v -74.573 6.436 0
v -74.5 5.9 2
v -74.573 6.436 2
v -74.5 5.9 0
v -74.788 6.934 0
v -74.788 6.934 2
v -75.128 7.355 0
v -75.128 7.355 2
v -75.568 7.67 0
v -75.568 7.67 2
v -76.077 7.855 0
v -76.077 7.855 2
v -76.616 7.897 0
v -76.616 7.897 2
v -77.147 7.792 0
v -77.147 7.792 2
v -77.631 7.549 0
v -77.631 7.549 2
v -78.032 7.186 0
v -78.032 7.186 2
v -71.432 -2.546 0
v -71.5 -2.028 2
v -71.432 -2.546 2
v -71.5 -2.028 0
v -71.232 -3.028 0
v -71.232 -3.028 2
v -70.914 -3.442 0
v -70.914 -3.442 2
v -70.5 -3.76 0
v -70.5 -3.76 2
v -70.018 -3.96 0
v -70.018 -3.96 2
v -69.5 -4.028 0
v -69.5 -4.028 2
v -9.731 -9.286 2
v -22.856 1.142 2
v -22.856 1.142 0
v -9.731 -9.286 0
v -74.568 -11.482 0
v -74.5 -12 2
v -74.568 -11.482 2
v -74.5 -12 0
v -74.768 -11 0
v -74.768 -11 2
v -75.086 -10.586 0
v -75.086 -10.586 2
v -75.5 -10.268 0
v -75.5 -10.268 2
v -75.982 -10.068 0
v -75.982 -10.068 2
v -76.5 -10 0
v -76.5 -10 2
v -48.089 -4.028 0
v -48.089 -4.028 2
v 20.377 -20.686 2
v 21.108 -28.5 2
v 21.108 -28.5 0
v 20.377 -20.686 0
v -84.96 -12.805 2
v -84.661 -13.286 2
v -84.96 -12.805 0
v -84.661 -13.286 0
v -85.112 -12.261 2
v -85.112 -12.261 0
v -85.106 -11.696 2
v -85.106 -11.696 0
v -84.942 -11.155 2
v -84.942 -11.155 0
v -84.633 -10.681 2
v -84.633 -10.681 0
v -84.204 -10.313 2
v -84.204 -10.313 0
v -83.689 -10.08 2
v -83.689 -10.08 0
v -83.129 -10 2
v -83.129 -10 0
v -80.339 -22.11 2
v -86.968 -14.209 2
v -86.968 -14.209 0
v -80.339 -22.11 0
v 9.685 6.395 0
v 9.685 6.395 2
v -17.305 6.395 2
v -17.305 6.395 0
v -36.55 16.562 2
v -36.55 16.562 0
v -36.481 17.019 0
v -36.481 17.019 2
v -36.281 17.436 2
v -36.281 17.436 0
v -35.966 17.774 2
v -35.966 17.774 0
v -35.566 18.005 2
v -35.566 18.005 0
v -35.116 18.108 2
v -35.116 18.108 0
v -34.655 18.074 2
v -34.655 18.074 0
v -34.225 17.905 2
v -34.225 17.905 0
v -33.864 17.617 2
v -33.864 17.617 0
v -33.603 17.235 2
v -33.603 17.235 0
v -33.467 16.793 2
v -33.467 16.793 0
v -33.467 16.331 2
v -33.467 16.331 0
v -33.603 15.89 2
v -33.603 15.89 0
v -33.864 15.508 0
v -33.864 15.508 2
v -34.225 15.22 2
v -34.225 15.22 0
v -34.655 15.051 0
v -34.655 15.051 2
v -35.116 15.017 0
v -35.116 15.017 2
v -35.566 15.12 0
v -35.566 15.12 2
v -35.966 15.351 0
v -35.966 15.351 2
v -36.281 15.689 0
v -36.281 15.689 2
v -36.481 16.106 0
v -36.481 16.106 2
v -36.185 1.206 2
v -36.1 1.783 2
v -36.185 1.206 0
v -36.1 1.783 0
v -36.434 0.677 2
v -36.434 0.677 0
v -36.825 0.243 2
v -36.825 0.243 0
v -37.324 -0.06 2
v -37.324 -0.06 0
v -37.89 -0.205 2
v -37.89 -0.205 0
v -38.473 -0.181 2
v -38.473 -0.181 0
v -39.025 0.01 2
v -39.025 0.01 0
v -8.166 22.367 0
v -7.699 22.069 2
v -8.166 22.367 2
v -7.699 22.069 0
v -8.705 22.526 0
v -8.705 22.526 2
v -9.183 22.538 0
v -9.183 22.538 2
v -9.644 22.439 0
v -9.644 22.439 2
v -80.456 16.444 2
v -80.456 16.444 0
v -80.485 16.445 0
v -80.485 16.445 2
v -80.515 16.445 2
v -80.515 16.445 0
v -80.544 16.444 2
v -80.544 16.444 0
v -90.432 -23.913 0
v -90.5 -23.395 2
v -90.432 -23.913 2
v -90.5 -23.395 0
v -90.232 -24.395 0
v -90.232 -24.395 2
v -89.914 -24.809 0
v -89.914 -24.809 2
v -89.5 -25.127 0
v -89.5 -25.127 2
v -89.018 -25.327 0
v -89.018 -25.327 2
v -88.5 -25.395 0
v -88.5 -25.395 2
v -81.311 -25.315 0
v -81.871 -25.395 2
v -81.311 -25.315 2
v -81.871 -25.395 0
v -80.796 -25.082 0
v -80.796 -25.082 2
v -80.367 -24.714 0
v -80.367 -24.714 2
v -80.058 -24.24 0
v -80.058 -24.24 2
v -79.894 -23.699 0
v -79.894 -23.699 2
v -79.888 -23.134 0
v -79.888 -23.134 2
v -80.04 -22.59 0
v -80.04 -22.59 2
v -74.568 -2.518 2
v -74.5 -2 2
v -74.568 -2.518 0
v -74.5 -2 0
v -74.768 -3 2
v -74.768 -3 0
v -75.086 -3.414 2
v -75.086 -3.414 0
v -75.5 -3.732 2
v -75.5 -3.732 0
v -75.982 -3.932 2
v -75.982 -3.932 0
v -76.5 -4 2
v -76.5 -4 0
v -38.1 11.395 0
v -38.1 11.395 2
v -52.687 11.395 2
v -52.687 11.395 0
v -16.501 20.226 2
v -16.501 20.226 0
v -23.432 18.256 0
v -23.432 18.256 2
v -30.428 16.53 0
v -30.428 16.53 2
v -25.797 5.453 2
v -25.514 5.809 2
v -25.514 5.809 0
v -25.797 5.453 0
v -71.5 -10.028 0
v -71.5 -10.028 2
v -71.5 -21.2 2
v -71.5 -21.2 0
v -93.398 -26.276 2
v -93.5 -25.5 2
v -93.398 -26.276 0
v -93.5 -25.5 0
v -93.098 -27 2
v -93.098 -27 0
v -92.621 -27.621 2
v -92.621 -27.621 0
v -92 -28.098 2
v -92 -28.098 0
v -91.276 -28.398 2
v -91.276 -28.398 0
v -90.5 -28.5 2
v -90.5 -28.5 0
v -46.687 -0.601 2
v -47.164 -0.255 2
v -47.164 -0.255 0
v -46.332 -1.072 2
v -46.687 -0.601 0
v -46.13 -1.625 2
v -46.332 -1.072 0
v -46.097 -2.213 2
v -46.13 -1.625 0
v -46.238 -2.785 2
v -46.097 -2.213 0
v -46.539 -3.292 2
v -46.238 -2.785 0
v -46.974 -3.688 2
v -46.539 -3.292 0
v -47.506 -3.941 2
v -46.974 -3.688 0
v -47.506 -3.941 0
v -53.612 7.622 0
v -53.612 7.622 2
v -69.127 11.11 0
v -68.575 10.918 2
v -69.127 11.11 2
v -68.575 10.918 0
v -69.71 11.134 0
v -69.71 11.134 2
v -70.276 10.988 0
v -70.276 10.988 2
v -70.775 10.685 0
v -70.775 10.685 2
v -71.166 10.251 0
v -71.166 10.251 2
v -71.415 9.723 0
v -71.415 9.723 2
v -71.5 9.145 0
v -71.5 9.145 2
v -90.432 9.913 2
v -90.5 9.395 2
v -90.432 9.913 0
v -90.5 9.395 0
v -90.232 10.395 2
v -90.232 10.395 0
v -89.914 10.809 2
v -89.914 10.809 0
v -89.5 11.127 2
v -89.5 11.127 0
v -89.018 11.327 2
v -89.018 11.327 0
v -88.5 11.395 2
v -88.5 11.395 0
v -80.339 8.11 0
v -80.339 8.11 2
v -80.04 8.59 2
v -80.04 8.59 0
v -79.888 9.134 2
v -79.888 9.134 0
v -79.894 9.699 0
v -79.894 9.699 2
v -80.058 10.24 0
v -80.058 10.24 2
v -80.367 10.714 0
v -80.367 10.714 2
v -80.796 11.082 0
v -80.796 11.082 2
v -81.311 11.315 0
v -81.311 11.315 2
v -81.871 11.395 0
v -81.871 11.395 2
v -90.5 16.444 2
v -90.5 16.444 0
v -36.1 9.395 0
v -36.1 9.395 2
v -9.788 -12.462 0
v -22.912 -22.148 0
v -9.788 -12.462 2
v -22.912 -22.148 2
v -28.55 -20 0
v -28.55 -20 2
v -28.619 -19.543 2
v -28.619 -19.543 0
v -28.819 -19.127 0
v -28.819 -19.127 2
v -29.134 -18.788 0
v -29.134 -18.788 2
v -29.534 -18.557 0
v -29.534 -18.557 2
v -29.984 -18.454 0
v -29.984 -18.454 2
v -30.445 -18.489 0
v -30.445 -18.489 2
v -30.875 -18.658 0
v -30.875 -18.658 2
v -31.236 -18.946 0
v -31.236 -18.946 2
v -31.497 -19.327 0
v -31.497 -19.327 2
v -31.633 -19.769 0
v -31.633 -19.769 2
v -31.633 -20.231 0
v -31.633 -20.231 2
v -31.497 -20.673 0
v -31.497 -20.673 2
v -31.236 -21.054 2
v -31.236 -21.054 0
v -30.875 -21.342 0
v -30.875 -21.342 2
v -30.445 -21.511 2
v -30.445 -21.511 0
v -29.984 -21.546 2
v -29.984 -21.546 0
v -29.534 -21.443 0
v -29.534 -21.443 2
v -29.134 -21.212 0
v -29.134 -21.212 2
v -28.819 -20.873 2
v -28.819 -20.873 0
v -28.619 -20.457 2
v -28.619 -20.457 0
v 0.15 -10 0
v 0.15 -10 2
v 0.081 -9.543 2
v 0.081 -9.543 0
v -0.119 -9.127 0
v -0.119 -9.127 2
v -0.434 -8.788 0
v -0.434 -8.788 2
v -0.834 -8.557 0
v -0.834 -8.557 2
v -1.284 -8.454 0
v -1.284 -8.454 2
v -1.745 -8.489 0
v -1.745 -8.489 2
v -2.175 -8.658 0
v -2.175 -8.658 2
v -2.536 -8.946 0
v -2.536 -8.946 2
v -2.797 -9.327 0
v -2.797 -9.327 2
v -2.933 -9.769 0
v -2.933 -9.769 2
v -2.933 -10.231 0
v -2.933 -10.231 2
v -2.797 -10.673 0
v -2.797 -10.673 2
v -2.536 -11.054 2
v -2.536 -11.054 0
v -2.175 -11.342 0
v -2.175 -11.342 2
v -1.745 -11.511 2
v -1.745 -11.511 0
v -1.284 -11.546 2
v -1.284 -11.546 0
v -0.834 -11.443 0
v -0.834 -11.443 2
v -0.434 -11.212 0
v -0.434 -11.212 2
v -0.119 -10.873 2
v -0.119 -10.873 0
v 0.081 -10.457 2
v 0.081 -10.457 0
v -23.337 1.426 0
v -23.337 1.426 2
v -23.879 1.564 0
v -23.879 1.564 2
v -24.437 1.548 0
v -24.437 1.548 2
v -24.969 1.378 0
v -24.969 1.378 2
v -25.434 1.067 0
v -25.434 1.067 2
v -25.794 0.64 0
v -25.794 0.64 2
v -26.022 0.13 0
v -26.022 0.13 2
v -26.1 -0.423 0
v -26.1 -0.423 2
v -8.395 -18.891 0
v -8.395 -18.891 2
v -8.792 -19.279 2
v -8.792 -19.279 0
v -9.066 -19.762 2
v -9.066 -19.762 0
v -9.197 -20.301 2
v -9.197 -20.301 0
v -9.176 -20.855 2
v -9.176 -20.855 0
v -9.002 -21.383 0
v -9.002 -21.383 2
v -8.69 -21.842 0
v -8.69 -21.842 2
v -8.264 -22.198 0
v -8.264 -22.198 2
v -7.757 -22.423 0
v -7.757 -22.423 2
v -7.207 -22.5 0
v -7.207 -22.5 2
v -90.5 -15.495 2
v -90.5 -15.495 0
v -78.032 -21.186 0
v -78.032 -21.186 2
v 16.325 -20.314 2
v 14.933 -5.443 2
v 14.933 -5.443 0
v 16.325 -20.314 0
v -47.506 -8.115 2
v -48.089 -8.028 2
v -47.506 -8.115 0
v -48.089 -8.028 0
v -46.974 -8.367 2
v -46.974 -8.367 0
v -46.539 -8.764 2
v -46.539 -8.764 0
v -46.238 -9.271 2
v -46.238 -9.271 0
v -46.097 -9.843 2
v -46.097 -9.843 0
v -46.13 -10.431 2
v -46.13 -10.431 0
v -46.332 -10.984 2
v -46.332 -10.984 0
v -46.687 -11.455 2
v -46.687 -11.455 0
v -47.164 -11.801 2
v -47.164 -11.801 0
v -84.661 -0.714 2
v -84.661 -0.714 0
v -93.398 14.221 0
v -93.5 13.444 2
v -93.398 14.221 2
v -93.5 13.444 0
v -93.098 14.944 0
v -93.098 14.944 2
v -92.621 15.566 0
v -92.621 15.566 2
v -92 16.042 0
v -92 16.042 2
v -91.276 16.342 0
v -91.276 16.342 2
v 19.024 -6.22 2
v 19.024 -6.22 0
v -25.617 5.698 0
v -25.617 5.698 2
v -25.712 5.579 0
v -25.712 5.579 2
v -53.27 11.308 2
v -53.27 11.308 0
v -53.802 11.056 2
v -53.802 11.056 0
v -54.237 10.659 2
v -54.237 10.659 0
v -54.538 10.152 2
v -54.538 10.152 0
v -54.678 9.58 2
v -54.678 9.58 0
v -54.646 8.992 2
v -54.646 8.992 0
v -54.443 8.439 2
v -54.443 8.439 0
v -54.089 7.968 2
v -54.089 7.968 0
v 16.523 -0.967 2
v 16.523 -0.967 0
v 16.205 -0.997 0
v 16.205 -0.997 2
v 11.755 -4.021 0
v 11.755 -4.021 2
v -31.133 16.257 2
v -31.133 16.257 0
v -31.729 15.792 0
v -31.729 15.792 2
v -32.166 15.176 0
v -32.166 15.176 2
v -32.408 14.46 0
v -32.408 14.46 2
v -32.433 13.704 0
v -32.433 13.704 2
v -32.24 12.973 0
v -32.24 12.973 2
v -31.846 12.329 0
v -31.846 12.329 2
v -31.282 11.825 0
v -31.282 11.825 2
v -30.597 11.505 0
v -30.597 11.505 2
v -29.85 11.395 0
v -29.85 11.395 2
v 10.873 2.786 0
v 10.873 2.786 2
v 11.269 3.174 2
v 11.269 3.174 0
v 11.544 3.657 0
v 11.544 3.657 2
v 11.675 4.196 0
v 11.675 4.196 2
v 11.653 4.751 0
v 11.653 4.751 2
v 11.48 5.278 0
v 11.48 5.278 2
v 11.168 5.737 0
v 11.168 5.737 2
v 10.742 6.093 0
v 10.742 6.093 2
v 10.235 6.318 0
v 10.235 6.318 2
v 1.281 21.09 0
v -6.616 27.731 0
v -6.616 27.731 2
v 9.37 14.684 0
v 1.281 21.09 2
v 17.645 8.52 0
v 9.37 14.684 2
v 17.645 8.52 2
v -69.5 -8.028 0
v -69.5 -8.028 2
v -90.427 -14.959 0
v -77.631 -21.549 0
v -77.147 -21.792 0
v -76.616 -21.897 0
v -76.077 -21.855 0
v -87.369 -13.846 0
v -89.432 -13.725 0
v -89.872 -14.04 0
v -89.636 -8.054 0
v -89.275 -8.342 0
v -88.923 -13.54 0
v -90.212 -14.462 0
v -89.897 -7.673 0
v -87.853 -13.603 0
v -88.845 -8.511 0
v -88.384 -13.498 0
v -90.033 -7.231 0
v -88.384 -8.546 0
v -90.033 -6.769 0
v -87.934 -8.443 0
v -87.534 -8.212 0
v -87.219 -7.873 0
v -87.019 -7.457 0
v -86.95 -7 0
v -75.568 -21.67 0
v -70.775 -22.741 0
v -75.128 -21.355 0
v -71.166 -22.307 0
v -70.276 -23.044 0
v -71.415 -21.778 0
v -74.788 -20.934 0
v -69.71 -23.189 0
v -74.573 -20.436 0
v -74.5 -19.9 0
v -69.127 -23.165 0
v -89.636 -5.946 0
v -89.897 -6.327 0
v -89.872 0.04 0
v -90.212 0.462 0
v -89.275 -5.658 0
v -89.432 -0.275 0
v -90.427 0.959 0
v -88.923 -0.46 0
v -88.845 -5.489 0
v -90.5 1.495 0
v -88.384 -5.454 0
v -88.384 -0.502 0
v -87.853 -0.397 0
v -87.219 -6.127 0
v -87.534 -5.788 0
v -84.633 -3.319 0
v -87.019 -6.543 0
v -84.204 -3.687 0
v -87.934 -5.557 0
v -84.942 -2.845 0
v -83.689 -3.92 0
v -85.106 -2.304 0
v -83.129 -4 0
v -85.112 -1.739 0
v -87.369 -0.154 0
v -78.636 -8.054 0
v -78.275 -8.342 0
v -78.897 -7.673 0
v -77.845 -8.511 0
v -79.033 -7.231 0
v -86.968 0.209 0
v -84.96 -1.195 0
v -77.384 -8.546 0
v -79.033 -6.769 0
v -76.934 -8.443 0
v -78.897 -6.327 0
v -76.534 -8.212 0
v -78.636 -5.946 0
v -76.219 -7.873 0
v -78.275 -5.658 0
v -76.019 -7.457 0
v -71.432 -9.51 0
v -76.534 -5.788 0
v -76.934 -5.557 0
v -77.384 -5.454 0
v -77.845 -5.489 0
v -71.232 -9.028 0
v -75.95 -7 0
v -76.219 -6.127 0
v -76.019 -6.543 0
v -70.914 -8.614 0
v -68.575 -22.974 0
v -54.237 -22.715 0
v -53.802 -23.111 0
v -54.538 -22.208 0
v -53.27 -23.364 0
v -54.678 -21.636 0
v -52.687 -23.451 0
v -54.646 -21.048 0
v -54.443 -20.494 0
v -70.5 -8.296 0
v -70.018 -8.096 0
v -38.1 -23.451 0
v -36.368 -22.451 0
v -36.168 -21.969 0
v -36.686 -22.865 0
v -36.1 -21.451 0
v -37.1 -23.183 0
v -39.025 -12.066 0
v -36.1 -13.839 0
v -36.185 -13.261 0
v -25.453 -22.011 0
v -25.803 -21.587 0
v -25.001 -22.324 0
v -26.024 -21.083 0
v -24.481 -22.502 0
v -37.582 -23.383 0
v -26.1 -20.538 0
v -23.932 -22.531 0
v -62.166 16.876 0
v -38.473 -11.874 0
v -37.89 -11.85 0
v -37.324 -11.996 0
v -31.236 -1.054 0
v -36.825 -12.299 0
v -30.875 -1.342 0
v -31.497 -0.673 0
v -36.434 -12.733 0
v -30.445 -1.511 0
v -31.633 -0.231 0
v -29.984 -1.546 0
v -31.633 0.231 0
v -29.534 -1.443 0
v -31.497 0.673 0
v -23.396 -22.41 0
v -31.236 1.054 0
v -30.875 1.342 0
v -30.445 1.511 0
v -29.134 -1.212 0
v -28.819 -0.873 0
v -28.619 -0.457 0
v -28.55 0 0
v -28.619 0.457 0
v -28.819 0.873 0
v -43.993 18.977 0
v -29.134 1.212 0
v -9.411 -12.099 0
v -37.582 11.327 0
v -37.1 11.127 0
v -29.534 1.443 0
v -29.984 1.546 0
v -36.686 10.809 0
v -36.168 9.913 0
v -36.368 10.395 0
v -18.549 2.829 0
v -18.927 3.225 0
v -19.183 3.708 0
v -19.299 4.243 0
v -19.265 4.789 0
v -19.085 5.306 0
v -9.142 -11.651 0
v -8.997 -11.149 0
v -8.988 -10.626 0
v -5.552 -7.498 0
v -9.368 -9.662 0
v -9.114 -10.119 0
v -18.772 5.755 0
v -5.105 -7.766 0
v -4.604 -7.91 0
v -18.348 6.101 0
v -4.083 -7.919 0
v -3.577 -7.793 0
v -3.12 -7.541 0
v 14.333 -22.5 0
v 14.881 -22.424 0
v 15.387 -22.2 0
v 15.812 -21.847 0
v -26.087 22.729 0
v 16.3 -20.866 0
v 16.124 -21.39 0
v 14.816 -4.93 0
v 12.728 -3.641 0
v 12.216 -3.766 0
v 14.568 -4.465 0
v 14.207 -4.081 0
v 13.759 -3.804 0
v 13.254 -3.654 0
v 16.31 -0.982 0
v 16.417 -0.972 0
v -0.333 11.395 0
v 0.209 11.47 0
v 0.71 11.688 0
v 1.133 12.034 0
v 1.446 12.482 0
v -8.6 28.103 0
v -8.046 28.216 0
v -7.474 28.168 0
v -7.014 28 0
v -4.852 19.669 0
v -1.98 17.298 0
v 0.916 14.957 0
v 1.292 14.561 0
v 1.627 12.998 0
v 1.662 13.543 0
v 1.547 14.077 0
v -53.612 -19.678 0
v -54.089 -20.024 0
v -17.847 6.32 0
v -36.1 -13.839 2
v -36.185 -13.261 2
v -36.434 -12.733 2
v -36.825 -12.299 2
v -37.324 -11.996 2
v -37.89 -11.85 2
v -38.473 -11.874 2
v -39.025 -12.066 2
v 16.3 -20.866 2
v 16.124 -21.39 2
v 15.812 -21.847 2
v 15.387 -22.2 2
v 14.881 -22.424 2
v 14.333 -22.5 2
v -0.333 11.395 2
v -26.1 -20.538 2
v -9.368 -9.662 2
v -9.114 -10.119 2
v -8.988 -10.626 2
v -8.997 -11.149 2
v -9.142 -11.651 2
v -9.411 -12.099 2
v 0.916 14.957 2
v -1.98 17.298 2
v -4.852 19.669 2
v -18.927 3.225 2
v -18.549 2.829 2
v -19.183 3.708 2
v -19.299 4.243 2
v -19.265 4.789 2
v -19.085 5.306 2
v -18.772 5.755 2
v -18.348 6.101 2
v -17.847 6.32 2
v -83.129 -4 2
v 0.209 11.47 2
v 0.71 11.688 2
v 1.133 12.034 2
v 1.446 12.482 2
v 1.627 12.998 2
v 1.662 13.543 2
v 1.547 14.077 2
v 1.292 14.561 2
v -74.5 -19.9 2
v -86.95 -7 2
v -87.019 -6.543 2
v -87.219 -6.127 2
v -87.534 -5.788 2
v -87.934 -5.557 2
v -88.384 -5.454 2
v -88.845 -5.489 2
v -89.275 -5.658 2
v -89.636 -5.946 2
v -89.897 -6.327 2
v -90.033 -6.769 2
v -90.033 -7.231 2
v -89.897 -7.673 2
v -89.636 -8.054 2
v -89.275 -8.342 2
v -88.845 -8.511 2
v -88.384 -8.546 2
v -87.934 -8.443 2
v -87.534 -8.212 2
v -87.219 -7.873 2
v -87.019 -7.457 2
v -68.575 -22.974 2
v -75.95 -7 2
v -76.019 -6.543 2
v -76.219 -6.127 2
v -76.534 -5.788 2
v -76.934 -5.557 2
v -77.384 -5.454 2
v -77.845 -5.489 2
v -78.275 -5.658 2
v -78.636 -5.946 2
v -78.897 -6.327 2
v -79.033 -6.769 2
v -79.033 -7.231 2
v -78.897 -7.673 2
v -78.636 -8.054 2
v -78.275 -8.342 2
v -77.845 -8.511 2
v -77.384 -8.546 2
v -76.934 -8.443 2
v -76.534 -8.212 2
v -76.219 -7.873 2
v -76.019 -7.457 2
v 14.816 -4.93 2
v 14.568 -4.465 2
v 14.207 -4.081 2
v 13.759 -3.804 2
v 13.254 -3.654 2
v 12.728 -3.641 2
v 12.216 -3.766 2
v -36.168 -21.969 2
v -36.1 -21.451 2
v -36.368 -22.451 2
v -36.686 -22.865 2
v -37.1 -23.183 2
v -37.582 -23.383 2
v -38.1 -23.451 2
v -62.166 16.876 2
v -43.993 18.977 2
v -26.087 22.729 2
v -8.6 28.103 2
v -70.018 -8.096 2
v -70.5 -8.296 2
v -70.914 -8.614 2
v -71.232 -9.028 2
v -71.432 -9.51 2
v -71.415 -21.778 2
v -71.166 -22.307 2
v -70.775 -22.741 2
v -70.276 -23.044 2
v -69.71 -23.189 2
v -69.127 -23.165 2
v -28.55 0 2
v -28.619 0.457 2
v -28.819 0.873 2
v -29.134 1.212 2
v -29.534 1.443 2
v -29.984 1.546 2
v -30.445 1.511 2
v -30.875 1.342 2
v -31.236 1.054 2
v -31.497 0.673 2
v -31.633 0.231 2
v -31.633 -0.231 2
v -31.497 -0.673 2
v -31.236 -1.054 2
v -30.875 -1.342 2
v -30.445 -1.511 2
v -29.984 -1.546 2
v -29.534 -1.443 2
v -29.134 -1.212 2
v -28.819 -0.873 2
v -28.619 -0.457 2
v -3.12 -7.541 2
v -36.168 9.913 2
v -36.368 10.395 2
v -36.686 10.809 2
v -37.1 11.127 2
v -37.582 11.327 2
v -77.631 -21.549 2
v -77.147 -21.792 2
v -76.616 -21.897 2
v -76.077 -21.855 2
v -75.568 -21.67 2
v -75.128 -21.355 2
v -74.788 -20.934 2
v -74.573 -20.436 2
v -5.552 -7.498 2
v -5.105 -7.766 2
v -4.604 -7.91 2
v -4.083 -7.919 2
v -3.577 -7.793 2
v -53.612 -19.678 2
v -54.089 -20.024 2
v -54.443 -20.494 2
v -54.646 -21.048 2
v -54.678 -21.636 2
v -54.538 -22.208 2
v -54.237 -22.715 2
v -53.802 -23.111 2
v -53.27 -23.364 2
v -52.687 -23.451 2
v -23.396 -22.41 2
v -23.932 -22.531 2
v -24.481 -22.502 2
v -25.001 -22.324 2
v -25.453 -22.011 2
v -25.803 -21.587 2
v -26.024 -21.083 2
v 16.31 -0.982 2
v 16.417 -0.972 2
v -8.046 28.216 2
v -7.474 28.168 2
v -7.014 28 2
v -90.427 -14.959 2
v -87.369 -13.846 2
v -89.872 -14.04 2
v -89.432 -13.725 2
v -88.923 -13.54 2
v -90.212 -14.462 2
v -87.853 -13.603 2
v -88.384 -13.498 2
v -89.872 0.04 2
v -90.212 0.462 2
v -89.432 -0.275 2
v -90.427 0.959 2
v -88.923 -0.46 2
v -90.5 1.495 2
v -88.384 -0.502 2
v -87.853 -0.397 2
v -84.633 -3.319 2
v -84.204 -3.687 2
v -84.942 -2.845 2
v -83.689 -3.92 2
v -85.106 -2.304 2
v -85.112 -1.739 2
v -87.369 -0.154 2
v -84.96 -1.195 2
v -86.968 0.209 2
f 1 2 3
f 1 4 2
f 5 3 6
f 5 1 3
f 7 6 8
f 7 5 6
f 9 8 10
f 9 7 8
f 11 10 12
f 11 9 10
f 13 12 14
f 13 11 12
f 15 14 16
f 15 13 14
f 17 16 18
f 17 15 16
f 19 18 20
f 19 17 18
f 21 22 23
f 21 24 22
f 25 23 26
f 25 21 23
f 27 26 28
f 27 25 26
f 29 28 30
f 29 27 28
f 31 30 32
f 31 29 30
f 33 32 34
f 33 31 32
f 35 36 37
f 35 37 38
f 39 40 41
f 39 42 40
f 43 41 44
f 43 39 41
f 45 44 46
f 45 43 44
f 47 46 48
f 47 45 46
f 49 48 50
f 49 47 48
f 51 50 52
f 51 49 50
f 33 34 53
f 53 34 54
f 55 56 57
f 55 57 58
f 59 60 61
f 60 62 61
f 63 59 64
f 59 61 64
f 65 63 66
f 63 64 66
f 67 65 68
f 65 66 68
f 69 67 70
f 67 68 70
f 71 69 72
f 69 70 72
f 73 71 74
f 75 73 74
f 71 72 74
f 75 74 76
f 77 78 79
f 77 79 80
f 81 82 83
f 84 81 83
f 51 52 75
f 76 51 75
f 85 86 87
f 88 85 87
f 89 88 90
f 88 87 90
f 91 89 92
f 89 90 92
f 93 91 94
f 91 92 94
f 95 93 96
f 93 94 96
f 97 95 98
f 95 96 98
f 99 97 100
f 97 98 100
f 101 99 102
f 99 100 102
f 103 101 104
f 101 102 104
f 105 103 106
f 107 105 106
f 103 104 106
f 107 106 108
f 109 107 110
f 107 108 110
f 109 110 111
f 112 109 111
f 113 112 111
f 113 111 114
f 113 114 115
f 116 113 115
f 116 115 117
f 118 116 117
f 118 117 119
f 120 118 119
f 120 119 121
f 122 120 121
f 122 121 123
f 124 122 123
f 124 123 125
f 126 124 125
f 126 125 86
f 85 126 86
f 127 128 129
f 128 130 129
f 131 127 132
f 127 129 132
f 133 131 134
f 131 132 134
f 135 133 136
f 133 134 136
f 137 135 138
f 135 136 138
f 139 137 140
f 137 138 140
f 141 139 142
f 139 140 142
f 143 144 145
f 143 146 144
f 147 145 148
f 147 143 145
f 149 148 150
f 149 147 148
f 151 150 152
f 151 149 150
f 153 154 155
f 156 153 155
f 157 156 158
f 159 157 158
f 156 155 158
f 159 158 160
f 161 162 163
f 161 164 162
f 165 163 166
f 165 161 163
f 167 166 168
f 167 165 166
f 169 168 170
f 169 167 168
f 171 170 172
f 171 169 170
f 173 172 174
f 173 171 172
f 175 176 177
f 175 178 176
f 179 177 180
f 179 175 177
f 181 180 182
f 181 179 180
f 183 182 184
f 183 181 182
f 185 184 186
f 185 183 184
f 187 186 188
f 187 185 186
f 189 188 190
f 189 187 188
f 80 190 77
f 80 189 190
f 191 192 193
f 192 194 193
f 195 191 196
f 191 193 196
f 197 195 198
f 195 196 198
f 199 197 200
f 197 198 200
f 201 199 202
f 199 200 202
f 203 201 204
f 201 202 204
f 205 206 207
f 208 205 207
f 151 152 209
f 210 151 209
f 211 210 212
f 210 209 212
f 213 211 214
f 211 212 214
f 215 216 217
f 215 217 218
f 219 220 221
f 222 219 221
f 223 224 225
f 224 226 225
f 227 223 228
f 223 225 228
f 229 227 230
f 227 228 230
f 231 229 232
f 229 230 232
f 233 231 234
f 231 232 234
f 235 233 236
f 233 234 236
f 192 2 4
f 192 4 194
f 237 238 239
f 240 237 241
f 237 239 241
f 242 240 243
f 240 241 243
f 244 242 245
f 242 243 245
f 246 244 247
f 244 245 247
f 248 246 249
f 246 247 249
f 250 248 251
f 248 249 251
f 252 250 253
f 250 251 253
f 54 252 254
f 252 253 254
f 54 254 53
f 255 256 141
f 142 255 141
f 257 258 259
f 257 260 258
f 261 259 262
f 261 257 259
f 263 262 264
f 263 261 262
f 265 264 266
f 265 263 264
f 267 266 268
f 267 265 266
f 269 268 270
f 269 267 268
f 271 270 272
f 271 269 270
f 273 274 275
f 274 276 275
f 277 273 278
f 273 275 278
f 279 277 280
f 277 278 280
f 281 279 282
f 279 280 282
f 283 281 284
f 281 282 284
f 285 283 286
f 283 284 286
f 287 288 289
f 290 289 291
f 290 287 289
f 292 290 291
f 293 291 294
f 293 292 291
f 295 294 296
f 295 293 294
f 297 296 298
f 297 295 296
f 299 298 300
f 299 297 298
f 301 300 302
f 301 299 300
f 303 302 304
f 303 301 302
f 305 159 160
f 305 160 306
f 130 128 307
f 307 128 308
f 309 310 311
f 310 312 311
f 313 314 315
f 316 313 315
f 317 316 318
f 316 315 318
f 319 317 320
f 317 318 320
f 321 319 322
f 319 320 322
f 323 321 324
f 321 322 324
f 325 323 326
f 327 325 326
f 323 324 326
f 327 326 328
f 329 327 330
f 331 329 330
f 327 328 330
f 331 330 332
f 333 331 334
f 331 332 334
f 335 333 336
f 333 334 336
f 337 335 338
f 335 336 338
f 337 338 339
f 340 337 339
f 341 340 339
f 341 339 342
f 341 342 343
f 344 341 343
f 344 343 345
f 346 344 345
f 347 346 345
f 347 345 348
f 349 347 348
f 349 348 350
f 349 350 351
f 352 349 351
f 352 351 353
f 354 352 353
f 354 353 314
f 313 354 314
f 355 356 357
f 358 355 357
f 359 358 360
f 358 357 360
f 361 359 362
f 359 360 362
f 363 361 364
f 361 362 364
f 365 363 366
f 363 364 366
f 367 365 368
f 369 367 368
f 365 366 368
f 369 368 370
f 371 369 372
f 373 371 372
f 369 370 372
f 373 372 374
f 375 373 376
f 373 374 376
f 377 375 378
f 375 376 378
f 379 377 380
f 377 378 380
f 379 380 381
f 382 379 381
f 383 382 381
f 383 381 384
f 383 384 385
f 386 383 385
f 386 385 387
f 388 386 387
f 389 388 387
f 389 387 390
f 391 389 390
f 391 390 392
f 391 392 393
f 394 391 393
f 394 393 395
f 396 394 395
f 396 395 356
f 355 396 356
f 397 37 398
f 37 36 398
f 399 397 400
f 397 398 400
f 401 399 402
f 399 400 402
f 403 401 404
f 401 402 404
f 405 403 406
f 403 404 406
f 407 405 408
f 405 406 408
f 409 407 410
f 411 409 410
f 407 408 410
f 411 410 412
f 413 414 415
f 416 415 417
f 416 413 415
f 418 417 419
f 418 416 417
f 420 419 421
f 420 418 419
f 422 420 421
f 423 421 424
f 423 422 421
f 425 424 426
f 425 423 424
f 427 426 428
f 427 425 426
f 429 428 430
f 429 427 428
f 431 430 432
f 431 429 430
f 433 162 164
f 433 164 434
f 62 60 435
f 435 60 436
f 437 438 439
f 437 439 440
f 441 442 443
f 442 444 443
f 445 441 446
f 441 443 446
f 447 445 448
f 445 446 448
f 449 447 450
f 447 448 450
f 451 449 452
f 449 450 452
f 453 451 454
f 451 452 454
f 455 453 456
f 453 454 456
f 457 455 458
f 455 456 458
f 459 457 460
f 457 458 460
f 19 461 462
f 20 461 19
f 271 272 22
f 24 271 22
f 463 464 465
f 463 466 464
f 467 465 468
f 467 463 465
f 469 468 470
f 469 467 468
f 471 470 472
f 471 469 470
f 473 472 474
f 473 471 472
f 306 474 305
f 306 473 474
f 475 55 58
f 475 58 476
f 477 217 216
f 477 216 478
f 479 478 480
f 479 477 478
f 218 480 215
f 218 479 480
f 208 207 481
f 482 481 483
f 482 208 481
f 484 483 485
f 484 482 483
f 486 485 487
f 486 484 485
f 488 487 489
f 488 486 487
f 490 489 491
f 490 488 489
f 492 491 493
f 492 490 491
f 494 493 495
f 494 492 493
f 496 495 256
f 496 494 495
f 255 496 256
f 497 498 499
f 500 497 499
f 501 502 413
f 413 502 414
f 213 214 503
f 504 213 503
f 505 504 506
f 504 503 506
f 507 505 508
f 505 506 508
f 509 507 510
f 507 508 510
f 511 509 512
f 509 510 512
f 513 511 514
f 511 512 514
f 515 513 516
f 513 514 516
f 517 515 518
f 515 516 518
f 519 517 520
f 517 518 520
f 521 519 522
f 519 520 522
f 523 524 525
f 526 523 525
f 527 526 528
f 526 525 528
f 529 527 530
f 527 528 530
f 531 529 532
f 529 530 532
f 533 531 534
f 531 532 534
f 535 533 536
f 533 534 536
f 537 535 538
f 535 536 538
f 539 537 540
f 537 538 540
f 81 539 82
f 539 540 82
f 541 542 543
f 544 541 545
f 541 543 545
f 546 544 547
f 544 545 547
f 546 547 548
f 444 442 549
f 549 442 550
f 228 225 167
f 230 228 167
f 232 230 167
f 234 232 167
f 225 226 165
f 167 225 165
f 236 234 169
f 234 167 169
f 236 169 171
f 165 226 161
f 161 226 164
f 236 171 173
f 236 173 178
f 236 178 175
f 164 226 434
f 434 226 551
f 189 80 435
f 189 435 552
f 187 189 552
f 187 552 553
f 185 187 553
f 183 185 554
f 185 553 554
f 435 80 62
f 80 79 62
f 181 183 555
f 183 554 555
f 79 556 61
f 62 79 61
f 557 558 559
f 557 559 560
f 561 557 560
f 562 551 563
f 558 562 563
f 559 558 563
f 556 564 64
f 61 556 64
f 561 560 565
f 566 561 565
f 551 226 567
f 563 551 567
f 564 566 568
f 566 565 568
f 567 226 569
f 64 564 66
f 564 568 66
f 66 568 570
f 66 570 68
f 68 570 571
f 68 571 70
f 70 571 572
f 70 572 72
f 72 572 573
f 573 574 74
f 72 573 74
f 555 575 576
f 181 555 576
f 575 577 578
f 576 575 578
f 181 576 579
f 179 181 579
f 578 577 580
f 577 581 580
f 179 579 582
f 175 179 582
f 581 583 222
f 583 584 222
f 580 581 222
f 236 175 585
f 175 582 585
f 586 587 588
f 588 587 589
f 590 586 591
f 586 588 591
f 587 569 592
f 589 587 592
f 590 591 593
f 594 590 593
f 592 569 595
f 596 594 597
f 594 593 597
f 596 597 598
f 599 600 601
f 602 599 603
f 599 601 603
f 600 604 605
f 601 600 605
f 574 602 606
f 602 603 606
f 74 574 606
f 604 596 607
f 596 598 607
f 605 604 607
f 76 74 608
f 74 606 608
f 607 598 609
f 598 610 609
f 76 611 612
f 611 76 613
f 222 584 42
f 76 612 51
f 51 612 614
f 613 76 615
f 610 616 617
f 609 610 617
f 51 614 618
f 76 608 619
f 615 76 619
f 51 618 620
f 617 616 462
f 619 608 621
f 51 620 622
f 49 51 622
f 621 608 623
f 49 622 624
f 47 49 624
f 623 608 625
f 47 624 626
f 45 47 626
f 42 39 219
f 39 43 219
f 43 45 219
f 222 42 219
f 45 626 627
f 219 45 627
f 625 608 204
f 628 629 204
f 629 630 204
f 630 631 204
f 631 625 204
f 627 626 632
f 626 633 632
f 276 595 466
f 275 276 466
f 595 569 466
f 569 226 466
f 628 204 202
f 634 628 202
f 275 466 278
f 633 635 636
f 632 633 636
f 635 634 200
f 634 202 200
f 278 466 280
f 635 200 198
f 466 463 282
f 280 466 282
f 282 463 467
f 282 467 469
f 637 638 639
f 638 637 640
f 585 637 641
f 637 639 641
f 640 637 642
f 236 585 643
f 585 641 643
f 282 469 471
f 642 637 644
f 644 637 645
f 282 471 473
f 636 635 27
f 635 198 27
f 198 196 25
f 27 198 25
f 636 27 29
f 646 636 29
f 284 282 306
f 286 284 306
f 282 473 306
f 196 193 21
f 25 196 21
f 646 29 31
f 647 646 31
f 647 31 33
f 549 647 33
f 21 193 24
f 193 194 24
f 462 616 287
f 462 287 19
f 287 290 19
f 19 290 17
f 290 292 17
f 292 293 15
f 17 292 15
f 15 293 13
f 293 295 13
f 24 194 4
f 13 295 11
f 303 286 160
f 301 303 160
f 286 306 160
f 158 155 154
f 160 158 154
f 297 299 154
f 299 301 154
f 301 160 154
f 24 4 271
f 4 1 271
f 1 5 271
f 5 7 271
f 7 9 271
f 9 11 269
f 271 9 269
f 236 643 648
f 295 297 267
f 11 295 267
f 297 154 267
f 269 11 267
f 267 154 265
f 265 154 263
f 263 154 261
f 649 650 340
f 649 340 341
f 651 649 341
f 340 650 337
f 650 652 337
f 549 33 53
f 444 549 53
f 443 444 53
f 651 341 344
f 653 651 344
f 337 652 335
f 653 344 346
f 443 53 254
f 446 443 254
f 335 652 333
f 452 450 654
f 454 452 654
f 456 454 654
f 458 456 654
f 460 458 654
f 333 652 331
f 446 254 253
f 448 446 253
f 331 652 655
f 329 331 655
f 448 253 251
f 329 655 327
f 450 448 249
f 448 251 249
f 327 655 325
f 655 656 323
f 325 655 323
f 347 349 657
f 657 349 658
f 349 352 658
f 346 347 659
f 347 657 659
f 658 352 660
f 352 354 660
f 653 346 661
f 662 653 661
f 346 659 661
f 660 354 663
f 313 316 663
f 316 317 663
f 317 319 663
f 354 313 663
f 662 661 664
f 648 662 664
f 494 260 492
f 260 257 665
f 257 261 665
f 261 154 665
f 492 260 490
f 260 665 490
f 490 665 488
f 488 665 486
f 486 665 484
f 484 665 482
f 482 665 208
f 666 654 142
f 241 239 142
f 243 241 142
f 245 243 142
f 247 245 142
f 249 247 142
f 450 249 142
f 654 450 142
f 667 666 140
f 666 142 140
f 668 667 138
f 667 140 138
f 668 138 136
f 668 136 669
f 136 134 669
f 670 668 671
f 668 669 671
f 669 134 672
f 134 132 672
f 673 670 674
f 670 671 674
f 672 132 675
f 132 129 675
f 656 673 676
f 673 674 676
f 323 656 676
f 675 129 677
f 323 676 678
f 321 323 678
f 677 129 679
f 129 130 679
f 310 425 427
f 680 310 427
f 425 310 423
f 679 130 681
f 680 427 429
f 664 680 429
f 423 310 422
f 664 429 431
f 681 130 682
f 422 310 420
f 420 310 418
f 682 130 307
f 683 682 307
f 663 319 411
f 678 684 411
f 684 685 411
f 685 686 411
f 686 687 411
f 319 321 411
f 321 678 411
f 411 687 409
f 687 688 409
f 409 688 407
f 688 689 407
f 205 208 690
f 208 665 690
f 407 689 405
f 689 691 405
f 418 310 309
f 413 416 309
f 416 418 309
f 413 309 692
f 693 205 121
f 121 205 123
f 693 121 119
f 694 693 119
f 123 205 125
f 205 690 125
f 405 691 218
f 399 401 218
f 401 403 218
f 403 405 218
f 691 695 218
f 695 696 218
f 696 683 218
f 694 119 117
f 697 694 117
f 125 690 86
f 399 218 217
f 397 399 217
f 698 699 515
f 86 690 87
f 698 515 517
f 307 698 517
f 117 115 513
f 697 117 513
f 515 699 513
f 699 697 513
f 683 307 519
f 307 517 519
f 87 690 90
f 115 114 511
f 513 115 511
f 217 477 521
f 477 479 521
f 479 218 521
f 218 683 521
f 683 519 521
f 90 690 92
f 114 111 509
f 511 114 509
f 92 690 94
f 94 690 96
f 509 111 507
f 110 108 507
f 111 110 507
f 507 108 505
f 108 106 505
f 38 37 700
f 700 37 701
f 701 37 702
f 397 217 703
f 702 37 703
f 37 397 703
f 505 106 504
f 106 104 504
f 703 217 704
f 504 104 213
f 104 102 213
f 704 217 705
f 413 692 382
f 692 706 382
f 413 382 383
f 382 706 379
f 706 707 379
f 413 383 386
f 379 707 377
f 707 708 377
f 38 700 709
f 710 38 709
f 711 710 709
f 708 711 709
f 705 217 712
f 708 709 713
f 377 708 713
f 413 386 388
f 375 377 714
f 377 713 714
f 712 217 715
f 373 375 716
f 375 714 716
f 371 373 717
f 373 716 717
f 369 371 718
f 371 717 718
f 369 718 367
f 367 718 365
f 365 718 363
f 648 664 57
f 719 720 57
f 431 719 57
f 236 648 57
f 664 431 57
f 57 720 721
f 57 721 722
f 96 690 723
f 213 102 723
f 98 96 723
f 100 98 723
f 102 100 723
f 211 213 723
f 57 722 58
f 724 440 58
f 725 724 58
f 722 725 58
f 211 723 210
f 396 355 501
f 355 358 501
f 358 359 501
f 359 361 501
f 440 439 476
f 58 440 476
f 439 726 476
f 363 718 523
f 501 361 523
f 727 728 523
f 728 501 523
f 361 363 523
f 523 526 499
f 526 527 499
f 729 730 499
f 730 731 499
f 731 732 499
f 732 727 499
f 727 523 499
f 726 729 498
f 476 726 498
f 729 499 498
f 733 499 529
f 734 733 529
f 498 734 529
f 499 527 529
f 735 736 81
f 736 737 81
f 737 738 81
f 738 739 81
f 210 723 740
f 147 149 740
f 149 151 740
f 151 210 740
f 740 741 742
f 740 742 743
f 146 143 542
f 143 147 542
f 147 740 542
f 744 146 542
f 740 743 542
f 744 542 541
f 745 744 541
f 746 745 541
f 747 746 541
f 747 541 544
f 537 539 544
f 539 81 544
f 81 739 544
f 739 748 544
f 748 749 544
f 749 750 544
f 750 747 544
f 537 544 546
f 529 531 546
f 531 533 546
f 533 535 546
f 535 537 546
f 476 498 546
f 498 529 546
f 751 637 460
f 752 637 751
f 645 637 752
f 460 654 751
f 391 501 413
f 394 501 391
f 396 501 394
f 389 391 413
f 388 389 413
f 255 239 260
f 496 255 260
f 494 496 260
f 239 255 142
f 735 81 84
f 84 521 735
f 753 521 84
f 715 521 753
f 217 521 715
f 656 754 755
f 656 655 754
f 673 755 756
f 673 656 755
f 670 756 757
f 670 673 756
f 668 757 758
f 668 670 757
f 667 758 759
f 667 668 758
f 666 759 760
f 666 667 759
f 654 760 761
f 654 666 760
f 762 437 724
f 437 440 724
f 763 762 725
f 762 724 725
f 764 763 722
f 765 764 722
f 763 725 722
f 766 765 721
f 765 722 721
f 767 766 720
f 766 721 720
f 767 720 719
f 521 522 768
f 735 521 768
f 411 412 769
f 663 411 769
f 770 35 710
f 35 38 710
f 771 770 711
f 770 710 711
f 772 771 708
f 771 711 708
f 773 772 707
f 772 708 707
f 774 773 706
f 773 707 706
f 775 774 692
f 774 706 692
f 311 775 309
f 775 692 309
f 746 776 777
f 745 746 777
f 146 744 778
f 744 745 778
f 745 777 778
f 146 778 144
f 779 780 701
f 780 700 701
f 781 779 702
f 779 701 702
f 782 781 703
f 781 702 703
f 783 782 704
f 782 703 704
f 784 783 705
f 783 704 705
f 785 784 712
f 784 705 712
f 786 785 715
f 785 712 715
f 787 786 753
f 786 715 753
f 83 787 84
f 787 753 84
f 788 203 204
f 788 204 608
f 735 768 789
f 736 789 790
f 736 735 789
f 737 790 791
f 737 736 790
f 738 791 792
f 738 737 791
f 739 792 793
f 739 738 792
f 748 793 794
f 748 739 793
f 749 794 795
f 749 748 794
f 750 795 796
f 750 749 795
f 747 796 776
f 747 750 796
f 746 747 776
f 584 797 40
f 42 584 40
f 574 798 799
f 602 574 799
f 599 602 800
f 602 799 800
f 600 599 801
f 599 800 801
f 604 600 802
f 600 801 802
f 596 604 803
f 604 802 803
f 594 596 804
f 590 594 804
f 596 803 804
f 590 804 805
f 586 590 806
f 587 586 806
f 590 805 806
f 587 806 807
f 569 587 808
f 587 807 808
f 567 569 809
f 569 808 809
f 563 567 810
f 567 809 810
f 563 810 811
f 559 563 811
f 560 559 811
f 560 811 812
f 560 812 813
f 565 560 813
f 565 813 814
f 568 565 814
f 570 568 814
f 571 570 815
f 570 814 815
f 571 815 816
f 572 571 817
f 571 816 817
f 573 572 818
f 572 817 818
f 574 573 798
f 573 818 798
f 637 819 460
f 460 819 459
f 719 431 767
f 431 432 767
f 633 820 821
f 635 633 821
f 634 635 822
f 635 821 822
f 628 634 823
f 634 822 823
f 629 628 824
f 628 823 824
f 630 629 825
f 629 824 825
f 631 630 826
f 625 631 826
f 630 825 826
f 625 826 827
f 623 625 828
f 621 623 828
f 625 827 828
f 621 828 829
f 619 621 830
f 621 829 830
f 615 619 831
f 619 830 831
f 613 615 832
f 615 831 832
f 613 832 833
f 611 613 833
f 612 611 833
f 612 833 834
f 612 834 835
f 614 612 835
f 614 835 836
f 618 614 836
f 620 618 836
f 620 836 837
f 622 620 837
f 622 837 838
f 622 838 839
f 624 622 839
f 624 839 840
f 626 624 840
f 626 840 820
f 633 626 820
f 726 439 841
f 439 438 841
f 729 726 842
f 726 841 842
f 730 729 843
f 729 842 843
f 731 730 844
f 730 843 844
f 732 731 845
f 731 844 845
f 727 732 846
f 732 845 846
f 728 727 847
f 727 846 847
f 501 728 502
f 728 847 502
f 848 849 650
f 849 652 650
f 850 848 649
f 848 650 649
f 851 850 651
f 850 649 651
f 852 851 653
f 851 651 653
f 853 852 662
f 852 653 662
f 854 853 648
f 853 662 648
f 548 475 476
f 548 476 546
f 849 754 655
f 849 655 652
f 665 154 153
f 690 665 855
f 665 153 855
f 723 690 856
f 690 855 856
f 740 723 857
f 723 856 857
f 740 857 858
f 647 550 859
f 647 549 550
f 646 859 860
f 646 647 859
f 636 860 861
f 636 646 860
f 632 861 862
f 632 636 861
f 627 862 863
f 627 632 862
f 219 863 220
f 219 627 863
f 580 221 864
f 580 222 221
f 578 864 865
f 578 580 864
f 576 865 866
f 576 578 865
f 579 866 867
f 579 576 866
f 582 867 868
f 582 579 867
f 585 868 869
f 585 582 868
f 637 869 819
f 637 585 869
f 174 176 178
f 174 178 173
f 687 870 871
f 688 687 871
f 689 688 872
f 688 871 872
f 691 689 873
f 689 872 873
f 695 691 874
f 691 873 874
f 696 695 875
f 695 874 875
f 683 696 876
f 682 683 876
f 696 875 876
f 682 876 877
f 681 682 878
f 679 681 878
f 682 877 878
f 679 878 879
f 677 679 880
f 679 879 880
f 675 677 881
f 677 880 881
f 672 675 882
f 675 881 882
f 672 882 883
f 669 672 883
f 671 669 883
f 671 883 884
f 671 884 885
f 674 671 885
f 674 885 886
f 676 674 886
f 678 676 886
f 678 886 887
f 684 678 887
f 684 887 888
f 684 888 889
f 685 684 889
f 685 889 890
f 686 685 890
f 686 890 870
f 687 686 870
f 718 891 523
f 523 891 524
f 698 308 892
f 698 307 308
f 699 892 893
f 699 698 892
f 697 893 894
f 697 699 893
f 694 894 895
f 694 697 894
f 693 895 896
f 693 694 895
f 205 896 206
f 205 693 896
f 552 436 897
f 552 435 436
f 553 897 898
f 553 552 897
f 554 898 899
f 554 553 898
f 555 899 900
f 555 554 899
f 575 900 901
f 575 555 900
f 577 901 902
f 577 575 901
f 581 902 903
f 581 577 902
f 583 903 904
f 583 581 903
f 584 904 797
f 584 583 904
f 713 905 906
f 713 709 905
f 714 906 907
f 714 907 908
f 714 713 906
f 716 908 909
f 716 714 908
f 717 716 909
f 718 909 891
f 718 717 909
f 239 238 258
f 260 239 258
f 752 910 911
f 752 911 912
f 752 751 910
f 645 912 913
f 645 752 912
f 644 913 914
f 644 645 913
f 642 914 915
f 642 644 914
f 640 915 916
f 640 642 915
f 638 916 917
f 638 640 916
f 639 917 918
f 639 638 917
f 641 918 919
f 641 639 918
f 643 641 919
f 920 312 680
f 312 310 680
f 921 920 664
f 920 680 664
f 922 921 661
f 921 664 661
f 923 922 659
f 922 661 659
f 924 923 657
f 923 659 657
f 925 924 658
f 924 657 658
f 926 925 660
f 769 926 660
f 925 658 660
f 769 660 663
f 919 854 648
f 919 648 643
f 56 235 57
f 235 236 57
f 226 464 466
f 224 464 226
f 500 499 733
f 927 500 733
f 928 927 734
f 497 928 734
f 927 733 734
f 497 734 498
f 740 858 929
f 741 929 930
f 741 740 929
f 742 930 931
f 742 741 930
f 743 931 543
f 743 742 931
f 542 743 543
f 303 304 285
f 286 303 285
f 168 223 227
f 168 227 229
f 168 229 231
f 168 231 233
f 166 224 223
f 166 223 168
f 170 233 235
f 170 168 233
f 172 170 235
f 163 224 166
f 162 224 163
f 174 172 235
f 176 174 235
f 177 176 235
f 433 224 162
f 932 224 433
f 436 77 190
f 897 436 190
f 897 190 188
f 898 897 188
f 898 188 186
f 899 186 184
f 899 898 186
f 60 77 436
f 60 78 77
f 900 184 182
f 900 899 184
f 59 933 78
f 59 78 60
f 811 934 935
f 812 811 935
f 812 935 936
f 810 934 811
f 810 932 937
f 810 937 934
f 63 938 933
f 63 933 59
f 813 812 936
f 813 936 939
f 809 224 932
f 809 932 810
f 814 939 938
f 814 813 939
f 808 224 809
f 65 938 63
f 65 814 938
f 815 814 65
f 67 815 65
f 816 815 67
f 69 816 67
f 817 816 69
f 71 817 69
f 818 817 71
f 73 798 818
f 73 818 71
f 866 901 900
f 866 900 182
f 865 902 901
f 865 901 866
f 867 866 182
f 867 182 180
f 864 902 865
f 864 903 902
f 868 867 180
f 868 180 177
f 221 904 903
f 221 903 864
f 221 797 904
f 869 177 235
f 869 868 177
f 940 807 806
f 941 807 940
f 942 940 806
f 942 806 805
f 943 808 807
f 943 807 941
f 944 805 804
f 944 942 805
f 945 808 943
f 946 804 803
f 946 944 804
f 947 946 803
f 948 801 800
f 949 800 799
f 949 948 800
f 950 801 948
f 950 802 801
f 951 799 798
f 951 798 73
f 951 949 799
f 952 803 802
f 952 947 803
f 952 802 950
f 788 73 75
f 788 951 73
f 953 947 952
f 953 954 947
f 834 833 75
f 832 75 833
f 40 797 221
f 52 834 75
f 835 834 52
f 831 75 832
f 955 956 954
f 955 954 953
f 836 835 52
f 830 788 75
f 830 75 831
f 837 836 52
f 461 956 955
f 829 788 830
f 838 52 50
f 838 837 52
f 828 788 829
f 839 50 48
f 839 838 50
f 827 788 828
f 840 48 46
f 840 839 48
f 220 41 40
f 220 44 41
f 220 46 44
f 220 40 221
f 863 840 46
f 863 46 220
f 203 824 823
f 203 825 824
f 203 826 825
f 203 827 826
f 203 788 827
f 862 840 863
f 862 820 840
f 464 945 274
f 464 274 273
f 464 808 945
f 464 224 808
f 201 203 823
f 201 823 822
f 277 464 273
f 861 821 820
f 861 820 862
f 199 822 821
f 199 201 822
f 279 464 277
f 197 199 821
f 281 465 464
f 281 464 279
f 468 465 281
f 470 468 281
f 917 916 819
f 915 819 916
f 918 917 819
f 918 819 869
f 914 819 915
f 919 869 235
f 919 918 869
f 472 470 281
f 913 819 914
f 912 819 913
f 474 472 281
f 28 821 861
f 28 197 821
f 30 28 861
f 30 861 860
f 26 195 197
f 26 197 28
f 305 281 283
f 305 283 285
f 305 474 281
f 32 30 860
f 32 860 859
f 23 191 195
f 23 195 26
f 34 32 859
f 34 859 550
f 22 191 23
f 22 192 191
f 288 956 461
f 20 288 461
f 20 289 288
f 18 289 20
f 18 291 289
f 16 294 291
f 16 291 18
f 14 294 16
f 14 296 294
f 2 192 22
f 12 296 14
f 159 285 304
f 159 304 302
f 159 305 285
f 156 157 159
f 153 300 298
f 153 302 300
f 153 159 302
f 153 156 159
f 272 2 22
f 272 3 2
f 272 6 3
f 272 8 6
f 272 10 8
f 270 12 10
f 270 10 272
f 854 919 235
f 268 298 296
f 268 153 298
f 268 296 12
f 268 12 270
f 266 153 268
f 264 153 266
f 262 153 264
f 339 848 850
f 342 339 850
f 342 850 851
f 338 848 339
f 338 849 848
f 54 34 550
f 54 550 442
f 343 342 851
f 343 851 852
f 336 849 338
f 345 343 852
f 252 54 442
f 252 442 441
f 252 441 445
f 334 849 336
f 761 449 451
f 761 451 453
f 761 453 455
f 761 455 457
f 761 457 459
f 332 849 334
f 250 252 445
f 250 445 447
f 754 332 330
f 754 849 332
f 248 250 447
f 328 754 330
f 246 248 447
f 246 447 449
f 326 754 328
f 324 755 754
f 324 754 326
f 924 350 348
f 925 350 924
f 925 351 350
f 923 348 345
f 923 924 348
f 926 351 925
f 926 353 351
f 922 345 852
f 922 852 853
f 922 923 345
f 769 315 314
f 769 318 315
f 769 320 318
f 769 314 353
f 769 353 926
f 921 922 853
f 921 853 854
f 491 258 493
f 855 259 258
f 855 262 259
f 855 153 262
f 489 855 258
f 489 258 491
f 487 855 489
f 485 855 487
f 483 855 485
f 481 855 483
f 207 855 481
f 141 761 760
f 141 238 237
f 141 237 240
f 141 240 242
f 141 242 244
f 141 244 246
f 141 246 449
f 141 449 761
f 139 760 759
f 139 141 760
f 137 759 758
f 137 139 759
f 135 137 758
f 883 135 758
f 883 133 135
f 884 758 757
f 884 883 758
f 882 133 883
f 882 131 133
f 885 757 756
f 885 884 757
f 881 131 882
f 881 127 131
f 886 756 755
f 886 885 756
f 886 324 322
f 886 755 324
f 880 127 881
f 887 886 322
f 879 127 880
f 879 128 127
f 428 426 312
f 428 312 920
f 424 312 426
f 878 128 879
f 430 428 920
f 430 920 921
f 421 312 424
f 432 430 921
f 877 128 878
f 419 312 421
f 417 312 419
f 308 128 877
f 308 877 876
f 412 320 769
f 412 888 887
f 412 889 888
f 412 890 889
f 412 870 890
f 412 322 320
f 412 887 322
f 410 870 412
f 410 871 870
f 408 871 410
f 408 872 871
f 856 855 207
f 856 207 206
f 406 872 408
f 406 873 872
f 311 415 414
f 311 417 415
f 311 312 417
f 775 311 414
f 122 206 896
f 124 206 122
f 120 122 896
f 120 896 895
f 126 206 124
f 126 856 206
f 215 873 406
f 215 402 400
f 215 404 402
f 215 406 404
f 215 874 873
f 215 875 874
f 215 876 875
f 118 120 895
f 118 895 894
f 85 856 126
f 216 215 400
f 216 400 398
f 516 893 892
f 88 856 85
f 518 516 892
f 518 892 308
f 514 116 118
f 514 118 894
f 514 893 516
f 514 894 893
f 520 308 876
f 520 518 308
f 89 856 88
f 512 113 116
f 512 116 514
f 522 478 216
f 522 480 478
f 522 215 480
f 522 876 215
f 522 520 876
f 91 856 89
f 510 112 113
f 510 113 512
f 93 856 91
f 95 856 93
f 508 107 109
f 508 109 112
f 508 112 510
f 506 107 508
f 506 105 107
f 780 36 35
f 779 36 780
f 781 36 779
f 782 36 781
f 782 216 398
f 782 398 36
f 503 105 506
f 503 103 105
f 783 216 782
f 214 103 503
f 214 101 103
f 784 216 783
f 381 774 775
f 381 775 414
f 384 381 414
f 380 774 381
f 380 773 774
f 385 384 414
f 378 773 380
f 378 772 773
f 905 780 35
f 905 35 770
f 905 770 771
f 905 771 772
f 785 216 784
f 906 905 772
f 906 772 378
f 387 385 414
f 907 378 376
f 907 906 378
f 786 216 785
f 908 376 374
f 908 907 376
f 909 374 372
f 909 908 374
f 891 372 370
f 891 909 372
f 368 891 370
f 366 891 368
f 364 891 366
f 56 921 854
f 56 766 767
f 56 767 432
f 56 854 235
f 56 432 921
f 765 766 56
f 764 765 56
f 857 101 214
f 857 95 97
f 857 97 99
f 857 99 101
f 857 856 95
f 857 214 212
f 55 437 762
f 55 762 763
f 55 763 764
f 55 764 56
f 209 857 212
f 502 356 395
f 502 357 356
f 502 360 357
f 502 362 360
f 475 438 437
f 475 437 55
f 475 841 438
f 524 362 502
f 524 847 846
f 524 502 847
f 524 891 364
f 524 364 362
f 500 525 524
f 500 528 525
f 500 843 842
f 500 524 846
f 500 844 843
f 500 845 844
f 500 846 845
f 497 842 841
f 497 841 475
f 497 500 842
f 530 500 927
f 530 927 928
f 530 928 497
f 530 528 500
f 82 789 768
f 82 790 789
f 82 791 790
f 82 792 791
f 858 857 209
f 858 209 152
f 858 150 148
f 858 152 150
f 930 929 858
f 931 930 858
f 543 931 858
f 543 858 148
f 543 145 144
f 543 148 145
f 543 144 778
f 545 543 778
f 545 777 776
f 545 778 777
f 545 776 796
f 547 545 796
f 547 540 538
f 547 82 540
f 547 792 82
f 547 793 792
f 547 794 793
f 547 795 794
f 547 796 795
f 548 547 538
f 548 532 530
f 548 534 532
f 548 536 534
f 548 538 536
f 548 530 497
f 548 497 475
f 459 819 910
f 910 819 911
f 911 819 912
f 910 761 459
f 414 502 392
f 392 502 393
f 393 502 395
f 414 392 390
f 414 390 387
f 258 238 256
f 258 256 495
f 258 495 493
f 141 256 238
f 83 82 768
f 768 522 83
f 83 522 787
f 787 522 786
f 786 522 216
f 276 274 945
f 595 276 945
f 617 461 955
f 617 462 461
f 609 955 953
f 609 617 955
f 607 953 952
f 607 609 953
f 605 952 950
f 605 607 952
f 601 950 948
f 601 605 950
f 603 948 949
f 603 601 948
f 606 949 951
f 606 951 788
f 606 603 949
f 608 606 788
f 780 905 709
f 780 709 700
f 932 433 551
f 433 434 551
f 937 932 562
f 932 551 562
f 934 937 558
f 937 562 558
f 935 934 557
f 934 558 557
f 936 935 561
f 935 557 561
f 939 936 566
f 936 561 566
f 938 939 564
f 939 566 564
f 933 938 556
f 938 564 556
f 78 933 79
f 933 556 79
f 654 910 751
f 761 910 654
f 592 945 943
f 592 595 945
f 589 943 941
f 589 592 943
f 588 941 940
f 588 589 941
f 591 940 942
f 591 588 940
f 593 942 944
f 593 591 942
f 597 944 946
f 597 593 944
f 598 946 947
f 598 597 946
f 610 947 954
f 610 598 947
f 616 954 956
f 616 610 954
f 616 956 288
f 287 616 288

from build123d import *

# Parameters (mm, degrees)
SKETCH_1_W           = 165
SKETCH_1_H           = 57
EXTRUDE_1_DEPTH      = 2
CUT_EXTRUDE_1_DEPTH  = 6
SKETCH_4_R           = 1.55
CUT_EXTRUDE_3_DEPTH  = 33
SKETCH_8_R           = 1.55
CUT_EXTRUDE_5_DEPTH  = 10
SKETCH_9_R           = 1.55
CUT_EXTRUDE_6_DEPTH  = 10
FILLET_3_R           = 2
FILLET_4_R           = 2
CUT_EXTRUDE_7_DEPTH  = 10
FILLET_8_R           = 2
CUT_EXTRUDE_8_DEPTH  = 10
FILLET_9_R           = 2
CUT_EXTRUDE_9_DEPTH  = 10
FILLET_10_R          = 2
EXTRUDE_4_DEPTH      = 2
FILLET_11_R          = 2
EXTRUDE_5_DEPTH      = 2
FILLET_12_R          = 2
CUT_EXTRUDE_10_DEPTH = 10
EXTRUDE_6_DEPTH      = 2
FILLET_13_R          = 3
SKETCH_18_R          = 1.55
CUT_EXTRUDE_12_DEPTH = 2
FILLET_14_R          = 2


with BuildPart() as part:
    # 草图1 → 凸台-拉伸1 (new body)
    with BuildSketch(Plane.XY):
        Rectangle(SKETCH_1_W, SKETCH_1_H)
    extrude(amount=EXTRUDE_1_DEPTH)

    # 草图2 → 切除-拉伸1 (cut)
    with BuildSketch(Plane.XY.offset(2)):
        with BuildLine():
            Line((82.5, 28.5), (-7.5, 28.5))
            ThreePointArc((-7.5, 28.5), (35.318614374, -3.444293093), (82.5, -28.5))
            Line((82.5, -28.5), (82.5, 28.5))
        make_face()
        with BuildLine():
            Line((-82.5, 28.5), (-82.5, 16.5))
            ThreePointArc((-82.5, 16.5), (-44.425115885, 18.906974283), (-7.5, 28.5))
            Line((-7.5, 28.5), (-82.5, 28.5))
        make_face()
    extrude(amount=-CUT_EXTRUDE_1_DEPTH, mode=Mode.SUBTRACT)

    # 草图4 → 切除-拉伸3 (cut)
    with BuildSketch(Plane.XY.offset(2)):
        with Locations((-77.5, -7)):
            Circle(SKETCH_4_R)
    extrude(amount=-CUT_EXTRUDE_3_DEPTH, mode=Mode.SUBTRACT)

    # 草图8 → 切除-拉伸5 (cut)
    with BuildSketch(Plane.XY.offset(2)):
        with Locations((-1.4, -10)):
            Circle(SKETCH_8_R)
        with Locations((-30.1, -20)):
            Circle(SKETCH_8_R)
        with Locations((-30.1, 0)):
            Circle(SKETCH_8_R)
    extrude(amount=-CUT_EXTRUDE_5_DEPTH, mode=Mode.SUBTRACT)

    # 草图9 → 切除-拉伸6 (cut)
    with BuildSketch(Plane(origin=(0, 0, 0), x_dir=(-1, 0, 0), z_dir=(0, 0, -1))):
        with Locations((35, 16.562431315)):
            Circle(SKETCH_9_R)
        with Locations((-40, -14.583150631)):
            Circle(SKETCH_9_R)
    extrude(amount=-CUT_EXTRUDE_6_DEPTH, mode=Mode.SUBTRACT)

    # 圆角3
    fillet_3_edges = [part.edges().sort_by_distance(p)[0] for p in [
        (-7.5, 28.5, 1),
    ]]
    fillet(fillet_3_edges, radius=FILLET_3_R)

    # 圆角4
    fillet_4_edges = [part.edges().sort_by_distance(p)[0] for p in [
        (-82.5, 16.5, 1),
        (-82.5, -28.5, 1),
    ]]
    fillet(fillet_4_edges, radius=FILLET_4_R)

    # 草图10 → 切除-拉伸7 (cut)
    with BuildSketch(Plane.XY.offset(2)):
        with BuildLine():
            Line((-29.849630584, 11.395100666), (5.446787044, 11.395100666))
            ThreePointArc((5.446787044, 11.395100666), (-1.632648985, 17.014079013), (-8.566742511, 22.811464555))
            ThreePointArc((-8.566742511, 22.811464555), (-19.410140236, 19.367286283), (-30.427912484, 16.529975425))
            ThreePointArc((-30.427912484, 16.529975425), (-32.433297975, 13.704131917), (-29.849630584, 11.395100666))
        make_face()
    extrude(amount=-CUT_EXTRUDE_7_DEPTH, mode=Mode.SUBTRACT)

    # 圆角8
    fillet_8_edges = [part.edges().sort_by_distance(p)[0] for p in [
        (-8.566742511, 22.811464555, 1),
        (5.446787044, 11.395100666, 1),
    ]]
    fillet(fillet_8_edges, radius=FILLET_8_R)

    # 草图11 → 切除-拉伸8 (cut)
    with BuildSketch(Plane.XY.offset(2)):
        Polygon((-36.1, -23.450877229), (-60.842981063, -23.450877229), (-36.1, -10.539715916), align=None)
        Polygon((-39.932804883, -8.027888281), (-71.5, -8.027888281), (-71.5, -24.5), align=None)
        Polygon((-39.932804883, -4.027888281), (-71.5, 12.444223438), (-71.5, -4.027888281), align=None)
        Polygon((-36.1, -1.516060646), (-36.1, 11.395100666), (-60.842981063, 11.395100666), align=None)
    extrude(amount=-CUT_EXTRUDE_8_DEPTH, mode=Mode.SUBTRACT)

    # 圆角9
    fillet_9_edges = [part.edges().sort_by_distance(p)[0] for p in [
        (-39.932804883, -8.027888281, 1),
        (-71.5, -24.5, 1),
        (-71.5, -8.027888281, 1),
        (-39.932804883, -4.027888281, 1),
        (-71.5, -4.027888281, 1),
        (-71.5, 12.444223438, 1),
        (-36.1, 11.395100666, 1),
        (-36.1, -1.516060646, 1),
        (-60.842981063, 11.395100666, 1),
        (-36.1, -23.450877229, 1),
        (-60.842981063, -23.450877229, 1),
        (-36.1, -10.539715916, 1),
    ]]
    fillet(fillet_9_edges, radius=FILLET_9_R)

    # 草图12 → 切除-拉伸9 (cut)
    with BuildSketch(Plane.XY.offset(2)):
        with BuildLine():
            Line((-26.1, 6.395100666), (-26.1, -24.5))
            Line((-26.1, -24.5), (10.872926165, 2.785876305))
            ThreePointArc((10.872926165, 2.785876305), (11.585120693, 5.020221166), (9.68532482, 6.395100666))
            Line((9.68532482, 6.395100666), (-26.1, 6.395100666))
        make_face()
        with BuildLine():
            Line((16.519718688, -0.503821347), (-13.285557865, -22.5))
            Line((-13.285557865, -22.5), (51.996010319, -22.5))
            ThreePointArc((51.996010319, -22.5), (33.937003057, -12.019408482), (16.519718688, -0.503821347))
        make_face()
    extrude(amount=-CUT_EXTRUDE_9_DEPTH, mode=Mode.SUBTRACT)

    # 圆角10
    fillet_10_edges = [part.edges().sort_by_distance(p)[0] for p in [
        (16.519718688, -0.503821347, 1),
        (51.996010319, -22.5, 1),
        (-13.285557865, -22.5, 1),
        (-26.1, 6.395100666, 1),
        (-26.1, -24.5, 1),
    ]]
    fillet(fillet_10_edges, radius=FILLET_10_R)

    # 草图13 → 凸台-拉伸4 (add)
    with BuildSketch(Plane.XY.offset(2)):
        Polygon((-26.758433391, 4.243454395), (-7.263956073, -11.246702958), (-4.352943402, -8.450756462), (-24.269993734, 7.375174063), align=None)
    extrude(amount=-EXTRUDE_4_DEPTH)

    # 圆角11
    fillet_11_edges = [part.edges().sort_by_distance(p)[0] for p in [
        (-26.1, 3.720268435, 1),
        (-7.686529087, -10.910929786, 1),
        (-4.352943402, -8.450756462, 1),
        (-23.036564134, 6.395100666, 1),
    ]]
    fillet(fillet_11_edges, radius=FILLET_11_R)

    # 草图14 → 凸台-拉伸5 (add)
    with BuildSketch(Plane.XY.offset(2)):
        Polygon((14.53207819, -1.153752135), (16.546586595, -22.68629933), (20.546624568, -22.5), (18.514686662, -0.781153475), align=None)
    extrude(amount=-EXTRUDE_5_DEPTH)

    # 圆角12
    fillet_12_edges = [part.edges().sort_by_distance(p)[0] for p in [
        (14.603571968, -1.917930204, 1),
        (16.529157093, -22.5, 1),
        (20.546624568, -22.5, 1),
        (18.626422966, -1.975473255, 1),
    ]]
    fillet(fillet_12_edges, radius=FILLET_12_R)

    # 草图15 → 切除-拉伸10 (cut)
    with BuildSketch(Plane.XY.offset(2)):
        with BuildLine():
            Line((21.107963193, -28.5), (17.644547538, 8.519533342))
            ThreePointArc((17.644547538, 8.519533342), (49.082122431, -11.724904385), (82.5, -28.5))
            Line((82.5, -28.5), (21.107963193, -28.5))
        make_face()
    extrude(amount=-CUT_EXTRUDE_10_DEPTH, mode=Mode.SUBTRACT)

    # 草图17 → 凸台-拉伸6 (add)
    with BuildSketch(Plane.XY.offset(2)):
        Polygon((-80.455675407, 16.444223438), (-93.5, 16.444223438), (-93.5, -28.5), (-80.442860064, -28.5), align=None)
    extrude(amount=-EXTRUDE_6_DEPTH)

    # 圆角13
    fillet_13_edges = [part.edges().sort_by_distance(p)[0] for p in [
        (-93.5, -28.5, 1),
        (-93.5, 16.444223438, 1),
    ]]
    fillet(fillet_13_edges, radius=FILLET_13_R)

    # 草图18 → 切除-拉伸12 (cut)
    with BuildSketch(Plane.XY.offset(2)):
        with Locations((-88.5, -7)):
            Circle(SKETCH_18_R)
        Polygon((-74.5, -4), (-87.418023291, -4), (-74.5, 11.395100666), align=None)
        Polygon((-90.5, 11.395100666), (-90.5, -4), (-77.581976709, 11.395100666), align=None)
        Polygon((-87.418023291, -10), (-74.5, -25.395100666), (-74.5, -10), align=None)
        Polygon((-90.5, -10), (-77.581976709, -25.395100666), (-90.5, -25.395100666), align=None)
    extrude(amount=-CUT_EXTRUDE_12_DEPTH, mode=Mode.SUBTRACT)

    # 圆角14
    fillet_14_edges = [part.edges().sort_by_distance(p)[0] for p in [
        (-87.418023291, -10, 1),
        (-74.5, -10, 1),
        (-74.5, -25.395100666, 1),
        (-90.5, -25.395100666, 1),
        (-90.5, -10, 1),
        (-77.581976709, -25.395100666, 1),
        (-74.5, 11.395100666, 1),
        (-74.5, -4, 1),
        (-87.418023291, -4, 1),
        (-90.5, 11.395100666, 1),
        (-77.581976709, 11.395100666, 1),
        (-90.5, -4, 1),
    ]]
    fillet(fillet_14_edges, radius=FILLET_14_R)


solid = part.part
